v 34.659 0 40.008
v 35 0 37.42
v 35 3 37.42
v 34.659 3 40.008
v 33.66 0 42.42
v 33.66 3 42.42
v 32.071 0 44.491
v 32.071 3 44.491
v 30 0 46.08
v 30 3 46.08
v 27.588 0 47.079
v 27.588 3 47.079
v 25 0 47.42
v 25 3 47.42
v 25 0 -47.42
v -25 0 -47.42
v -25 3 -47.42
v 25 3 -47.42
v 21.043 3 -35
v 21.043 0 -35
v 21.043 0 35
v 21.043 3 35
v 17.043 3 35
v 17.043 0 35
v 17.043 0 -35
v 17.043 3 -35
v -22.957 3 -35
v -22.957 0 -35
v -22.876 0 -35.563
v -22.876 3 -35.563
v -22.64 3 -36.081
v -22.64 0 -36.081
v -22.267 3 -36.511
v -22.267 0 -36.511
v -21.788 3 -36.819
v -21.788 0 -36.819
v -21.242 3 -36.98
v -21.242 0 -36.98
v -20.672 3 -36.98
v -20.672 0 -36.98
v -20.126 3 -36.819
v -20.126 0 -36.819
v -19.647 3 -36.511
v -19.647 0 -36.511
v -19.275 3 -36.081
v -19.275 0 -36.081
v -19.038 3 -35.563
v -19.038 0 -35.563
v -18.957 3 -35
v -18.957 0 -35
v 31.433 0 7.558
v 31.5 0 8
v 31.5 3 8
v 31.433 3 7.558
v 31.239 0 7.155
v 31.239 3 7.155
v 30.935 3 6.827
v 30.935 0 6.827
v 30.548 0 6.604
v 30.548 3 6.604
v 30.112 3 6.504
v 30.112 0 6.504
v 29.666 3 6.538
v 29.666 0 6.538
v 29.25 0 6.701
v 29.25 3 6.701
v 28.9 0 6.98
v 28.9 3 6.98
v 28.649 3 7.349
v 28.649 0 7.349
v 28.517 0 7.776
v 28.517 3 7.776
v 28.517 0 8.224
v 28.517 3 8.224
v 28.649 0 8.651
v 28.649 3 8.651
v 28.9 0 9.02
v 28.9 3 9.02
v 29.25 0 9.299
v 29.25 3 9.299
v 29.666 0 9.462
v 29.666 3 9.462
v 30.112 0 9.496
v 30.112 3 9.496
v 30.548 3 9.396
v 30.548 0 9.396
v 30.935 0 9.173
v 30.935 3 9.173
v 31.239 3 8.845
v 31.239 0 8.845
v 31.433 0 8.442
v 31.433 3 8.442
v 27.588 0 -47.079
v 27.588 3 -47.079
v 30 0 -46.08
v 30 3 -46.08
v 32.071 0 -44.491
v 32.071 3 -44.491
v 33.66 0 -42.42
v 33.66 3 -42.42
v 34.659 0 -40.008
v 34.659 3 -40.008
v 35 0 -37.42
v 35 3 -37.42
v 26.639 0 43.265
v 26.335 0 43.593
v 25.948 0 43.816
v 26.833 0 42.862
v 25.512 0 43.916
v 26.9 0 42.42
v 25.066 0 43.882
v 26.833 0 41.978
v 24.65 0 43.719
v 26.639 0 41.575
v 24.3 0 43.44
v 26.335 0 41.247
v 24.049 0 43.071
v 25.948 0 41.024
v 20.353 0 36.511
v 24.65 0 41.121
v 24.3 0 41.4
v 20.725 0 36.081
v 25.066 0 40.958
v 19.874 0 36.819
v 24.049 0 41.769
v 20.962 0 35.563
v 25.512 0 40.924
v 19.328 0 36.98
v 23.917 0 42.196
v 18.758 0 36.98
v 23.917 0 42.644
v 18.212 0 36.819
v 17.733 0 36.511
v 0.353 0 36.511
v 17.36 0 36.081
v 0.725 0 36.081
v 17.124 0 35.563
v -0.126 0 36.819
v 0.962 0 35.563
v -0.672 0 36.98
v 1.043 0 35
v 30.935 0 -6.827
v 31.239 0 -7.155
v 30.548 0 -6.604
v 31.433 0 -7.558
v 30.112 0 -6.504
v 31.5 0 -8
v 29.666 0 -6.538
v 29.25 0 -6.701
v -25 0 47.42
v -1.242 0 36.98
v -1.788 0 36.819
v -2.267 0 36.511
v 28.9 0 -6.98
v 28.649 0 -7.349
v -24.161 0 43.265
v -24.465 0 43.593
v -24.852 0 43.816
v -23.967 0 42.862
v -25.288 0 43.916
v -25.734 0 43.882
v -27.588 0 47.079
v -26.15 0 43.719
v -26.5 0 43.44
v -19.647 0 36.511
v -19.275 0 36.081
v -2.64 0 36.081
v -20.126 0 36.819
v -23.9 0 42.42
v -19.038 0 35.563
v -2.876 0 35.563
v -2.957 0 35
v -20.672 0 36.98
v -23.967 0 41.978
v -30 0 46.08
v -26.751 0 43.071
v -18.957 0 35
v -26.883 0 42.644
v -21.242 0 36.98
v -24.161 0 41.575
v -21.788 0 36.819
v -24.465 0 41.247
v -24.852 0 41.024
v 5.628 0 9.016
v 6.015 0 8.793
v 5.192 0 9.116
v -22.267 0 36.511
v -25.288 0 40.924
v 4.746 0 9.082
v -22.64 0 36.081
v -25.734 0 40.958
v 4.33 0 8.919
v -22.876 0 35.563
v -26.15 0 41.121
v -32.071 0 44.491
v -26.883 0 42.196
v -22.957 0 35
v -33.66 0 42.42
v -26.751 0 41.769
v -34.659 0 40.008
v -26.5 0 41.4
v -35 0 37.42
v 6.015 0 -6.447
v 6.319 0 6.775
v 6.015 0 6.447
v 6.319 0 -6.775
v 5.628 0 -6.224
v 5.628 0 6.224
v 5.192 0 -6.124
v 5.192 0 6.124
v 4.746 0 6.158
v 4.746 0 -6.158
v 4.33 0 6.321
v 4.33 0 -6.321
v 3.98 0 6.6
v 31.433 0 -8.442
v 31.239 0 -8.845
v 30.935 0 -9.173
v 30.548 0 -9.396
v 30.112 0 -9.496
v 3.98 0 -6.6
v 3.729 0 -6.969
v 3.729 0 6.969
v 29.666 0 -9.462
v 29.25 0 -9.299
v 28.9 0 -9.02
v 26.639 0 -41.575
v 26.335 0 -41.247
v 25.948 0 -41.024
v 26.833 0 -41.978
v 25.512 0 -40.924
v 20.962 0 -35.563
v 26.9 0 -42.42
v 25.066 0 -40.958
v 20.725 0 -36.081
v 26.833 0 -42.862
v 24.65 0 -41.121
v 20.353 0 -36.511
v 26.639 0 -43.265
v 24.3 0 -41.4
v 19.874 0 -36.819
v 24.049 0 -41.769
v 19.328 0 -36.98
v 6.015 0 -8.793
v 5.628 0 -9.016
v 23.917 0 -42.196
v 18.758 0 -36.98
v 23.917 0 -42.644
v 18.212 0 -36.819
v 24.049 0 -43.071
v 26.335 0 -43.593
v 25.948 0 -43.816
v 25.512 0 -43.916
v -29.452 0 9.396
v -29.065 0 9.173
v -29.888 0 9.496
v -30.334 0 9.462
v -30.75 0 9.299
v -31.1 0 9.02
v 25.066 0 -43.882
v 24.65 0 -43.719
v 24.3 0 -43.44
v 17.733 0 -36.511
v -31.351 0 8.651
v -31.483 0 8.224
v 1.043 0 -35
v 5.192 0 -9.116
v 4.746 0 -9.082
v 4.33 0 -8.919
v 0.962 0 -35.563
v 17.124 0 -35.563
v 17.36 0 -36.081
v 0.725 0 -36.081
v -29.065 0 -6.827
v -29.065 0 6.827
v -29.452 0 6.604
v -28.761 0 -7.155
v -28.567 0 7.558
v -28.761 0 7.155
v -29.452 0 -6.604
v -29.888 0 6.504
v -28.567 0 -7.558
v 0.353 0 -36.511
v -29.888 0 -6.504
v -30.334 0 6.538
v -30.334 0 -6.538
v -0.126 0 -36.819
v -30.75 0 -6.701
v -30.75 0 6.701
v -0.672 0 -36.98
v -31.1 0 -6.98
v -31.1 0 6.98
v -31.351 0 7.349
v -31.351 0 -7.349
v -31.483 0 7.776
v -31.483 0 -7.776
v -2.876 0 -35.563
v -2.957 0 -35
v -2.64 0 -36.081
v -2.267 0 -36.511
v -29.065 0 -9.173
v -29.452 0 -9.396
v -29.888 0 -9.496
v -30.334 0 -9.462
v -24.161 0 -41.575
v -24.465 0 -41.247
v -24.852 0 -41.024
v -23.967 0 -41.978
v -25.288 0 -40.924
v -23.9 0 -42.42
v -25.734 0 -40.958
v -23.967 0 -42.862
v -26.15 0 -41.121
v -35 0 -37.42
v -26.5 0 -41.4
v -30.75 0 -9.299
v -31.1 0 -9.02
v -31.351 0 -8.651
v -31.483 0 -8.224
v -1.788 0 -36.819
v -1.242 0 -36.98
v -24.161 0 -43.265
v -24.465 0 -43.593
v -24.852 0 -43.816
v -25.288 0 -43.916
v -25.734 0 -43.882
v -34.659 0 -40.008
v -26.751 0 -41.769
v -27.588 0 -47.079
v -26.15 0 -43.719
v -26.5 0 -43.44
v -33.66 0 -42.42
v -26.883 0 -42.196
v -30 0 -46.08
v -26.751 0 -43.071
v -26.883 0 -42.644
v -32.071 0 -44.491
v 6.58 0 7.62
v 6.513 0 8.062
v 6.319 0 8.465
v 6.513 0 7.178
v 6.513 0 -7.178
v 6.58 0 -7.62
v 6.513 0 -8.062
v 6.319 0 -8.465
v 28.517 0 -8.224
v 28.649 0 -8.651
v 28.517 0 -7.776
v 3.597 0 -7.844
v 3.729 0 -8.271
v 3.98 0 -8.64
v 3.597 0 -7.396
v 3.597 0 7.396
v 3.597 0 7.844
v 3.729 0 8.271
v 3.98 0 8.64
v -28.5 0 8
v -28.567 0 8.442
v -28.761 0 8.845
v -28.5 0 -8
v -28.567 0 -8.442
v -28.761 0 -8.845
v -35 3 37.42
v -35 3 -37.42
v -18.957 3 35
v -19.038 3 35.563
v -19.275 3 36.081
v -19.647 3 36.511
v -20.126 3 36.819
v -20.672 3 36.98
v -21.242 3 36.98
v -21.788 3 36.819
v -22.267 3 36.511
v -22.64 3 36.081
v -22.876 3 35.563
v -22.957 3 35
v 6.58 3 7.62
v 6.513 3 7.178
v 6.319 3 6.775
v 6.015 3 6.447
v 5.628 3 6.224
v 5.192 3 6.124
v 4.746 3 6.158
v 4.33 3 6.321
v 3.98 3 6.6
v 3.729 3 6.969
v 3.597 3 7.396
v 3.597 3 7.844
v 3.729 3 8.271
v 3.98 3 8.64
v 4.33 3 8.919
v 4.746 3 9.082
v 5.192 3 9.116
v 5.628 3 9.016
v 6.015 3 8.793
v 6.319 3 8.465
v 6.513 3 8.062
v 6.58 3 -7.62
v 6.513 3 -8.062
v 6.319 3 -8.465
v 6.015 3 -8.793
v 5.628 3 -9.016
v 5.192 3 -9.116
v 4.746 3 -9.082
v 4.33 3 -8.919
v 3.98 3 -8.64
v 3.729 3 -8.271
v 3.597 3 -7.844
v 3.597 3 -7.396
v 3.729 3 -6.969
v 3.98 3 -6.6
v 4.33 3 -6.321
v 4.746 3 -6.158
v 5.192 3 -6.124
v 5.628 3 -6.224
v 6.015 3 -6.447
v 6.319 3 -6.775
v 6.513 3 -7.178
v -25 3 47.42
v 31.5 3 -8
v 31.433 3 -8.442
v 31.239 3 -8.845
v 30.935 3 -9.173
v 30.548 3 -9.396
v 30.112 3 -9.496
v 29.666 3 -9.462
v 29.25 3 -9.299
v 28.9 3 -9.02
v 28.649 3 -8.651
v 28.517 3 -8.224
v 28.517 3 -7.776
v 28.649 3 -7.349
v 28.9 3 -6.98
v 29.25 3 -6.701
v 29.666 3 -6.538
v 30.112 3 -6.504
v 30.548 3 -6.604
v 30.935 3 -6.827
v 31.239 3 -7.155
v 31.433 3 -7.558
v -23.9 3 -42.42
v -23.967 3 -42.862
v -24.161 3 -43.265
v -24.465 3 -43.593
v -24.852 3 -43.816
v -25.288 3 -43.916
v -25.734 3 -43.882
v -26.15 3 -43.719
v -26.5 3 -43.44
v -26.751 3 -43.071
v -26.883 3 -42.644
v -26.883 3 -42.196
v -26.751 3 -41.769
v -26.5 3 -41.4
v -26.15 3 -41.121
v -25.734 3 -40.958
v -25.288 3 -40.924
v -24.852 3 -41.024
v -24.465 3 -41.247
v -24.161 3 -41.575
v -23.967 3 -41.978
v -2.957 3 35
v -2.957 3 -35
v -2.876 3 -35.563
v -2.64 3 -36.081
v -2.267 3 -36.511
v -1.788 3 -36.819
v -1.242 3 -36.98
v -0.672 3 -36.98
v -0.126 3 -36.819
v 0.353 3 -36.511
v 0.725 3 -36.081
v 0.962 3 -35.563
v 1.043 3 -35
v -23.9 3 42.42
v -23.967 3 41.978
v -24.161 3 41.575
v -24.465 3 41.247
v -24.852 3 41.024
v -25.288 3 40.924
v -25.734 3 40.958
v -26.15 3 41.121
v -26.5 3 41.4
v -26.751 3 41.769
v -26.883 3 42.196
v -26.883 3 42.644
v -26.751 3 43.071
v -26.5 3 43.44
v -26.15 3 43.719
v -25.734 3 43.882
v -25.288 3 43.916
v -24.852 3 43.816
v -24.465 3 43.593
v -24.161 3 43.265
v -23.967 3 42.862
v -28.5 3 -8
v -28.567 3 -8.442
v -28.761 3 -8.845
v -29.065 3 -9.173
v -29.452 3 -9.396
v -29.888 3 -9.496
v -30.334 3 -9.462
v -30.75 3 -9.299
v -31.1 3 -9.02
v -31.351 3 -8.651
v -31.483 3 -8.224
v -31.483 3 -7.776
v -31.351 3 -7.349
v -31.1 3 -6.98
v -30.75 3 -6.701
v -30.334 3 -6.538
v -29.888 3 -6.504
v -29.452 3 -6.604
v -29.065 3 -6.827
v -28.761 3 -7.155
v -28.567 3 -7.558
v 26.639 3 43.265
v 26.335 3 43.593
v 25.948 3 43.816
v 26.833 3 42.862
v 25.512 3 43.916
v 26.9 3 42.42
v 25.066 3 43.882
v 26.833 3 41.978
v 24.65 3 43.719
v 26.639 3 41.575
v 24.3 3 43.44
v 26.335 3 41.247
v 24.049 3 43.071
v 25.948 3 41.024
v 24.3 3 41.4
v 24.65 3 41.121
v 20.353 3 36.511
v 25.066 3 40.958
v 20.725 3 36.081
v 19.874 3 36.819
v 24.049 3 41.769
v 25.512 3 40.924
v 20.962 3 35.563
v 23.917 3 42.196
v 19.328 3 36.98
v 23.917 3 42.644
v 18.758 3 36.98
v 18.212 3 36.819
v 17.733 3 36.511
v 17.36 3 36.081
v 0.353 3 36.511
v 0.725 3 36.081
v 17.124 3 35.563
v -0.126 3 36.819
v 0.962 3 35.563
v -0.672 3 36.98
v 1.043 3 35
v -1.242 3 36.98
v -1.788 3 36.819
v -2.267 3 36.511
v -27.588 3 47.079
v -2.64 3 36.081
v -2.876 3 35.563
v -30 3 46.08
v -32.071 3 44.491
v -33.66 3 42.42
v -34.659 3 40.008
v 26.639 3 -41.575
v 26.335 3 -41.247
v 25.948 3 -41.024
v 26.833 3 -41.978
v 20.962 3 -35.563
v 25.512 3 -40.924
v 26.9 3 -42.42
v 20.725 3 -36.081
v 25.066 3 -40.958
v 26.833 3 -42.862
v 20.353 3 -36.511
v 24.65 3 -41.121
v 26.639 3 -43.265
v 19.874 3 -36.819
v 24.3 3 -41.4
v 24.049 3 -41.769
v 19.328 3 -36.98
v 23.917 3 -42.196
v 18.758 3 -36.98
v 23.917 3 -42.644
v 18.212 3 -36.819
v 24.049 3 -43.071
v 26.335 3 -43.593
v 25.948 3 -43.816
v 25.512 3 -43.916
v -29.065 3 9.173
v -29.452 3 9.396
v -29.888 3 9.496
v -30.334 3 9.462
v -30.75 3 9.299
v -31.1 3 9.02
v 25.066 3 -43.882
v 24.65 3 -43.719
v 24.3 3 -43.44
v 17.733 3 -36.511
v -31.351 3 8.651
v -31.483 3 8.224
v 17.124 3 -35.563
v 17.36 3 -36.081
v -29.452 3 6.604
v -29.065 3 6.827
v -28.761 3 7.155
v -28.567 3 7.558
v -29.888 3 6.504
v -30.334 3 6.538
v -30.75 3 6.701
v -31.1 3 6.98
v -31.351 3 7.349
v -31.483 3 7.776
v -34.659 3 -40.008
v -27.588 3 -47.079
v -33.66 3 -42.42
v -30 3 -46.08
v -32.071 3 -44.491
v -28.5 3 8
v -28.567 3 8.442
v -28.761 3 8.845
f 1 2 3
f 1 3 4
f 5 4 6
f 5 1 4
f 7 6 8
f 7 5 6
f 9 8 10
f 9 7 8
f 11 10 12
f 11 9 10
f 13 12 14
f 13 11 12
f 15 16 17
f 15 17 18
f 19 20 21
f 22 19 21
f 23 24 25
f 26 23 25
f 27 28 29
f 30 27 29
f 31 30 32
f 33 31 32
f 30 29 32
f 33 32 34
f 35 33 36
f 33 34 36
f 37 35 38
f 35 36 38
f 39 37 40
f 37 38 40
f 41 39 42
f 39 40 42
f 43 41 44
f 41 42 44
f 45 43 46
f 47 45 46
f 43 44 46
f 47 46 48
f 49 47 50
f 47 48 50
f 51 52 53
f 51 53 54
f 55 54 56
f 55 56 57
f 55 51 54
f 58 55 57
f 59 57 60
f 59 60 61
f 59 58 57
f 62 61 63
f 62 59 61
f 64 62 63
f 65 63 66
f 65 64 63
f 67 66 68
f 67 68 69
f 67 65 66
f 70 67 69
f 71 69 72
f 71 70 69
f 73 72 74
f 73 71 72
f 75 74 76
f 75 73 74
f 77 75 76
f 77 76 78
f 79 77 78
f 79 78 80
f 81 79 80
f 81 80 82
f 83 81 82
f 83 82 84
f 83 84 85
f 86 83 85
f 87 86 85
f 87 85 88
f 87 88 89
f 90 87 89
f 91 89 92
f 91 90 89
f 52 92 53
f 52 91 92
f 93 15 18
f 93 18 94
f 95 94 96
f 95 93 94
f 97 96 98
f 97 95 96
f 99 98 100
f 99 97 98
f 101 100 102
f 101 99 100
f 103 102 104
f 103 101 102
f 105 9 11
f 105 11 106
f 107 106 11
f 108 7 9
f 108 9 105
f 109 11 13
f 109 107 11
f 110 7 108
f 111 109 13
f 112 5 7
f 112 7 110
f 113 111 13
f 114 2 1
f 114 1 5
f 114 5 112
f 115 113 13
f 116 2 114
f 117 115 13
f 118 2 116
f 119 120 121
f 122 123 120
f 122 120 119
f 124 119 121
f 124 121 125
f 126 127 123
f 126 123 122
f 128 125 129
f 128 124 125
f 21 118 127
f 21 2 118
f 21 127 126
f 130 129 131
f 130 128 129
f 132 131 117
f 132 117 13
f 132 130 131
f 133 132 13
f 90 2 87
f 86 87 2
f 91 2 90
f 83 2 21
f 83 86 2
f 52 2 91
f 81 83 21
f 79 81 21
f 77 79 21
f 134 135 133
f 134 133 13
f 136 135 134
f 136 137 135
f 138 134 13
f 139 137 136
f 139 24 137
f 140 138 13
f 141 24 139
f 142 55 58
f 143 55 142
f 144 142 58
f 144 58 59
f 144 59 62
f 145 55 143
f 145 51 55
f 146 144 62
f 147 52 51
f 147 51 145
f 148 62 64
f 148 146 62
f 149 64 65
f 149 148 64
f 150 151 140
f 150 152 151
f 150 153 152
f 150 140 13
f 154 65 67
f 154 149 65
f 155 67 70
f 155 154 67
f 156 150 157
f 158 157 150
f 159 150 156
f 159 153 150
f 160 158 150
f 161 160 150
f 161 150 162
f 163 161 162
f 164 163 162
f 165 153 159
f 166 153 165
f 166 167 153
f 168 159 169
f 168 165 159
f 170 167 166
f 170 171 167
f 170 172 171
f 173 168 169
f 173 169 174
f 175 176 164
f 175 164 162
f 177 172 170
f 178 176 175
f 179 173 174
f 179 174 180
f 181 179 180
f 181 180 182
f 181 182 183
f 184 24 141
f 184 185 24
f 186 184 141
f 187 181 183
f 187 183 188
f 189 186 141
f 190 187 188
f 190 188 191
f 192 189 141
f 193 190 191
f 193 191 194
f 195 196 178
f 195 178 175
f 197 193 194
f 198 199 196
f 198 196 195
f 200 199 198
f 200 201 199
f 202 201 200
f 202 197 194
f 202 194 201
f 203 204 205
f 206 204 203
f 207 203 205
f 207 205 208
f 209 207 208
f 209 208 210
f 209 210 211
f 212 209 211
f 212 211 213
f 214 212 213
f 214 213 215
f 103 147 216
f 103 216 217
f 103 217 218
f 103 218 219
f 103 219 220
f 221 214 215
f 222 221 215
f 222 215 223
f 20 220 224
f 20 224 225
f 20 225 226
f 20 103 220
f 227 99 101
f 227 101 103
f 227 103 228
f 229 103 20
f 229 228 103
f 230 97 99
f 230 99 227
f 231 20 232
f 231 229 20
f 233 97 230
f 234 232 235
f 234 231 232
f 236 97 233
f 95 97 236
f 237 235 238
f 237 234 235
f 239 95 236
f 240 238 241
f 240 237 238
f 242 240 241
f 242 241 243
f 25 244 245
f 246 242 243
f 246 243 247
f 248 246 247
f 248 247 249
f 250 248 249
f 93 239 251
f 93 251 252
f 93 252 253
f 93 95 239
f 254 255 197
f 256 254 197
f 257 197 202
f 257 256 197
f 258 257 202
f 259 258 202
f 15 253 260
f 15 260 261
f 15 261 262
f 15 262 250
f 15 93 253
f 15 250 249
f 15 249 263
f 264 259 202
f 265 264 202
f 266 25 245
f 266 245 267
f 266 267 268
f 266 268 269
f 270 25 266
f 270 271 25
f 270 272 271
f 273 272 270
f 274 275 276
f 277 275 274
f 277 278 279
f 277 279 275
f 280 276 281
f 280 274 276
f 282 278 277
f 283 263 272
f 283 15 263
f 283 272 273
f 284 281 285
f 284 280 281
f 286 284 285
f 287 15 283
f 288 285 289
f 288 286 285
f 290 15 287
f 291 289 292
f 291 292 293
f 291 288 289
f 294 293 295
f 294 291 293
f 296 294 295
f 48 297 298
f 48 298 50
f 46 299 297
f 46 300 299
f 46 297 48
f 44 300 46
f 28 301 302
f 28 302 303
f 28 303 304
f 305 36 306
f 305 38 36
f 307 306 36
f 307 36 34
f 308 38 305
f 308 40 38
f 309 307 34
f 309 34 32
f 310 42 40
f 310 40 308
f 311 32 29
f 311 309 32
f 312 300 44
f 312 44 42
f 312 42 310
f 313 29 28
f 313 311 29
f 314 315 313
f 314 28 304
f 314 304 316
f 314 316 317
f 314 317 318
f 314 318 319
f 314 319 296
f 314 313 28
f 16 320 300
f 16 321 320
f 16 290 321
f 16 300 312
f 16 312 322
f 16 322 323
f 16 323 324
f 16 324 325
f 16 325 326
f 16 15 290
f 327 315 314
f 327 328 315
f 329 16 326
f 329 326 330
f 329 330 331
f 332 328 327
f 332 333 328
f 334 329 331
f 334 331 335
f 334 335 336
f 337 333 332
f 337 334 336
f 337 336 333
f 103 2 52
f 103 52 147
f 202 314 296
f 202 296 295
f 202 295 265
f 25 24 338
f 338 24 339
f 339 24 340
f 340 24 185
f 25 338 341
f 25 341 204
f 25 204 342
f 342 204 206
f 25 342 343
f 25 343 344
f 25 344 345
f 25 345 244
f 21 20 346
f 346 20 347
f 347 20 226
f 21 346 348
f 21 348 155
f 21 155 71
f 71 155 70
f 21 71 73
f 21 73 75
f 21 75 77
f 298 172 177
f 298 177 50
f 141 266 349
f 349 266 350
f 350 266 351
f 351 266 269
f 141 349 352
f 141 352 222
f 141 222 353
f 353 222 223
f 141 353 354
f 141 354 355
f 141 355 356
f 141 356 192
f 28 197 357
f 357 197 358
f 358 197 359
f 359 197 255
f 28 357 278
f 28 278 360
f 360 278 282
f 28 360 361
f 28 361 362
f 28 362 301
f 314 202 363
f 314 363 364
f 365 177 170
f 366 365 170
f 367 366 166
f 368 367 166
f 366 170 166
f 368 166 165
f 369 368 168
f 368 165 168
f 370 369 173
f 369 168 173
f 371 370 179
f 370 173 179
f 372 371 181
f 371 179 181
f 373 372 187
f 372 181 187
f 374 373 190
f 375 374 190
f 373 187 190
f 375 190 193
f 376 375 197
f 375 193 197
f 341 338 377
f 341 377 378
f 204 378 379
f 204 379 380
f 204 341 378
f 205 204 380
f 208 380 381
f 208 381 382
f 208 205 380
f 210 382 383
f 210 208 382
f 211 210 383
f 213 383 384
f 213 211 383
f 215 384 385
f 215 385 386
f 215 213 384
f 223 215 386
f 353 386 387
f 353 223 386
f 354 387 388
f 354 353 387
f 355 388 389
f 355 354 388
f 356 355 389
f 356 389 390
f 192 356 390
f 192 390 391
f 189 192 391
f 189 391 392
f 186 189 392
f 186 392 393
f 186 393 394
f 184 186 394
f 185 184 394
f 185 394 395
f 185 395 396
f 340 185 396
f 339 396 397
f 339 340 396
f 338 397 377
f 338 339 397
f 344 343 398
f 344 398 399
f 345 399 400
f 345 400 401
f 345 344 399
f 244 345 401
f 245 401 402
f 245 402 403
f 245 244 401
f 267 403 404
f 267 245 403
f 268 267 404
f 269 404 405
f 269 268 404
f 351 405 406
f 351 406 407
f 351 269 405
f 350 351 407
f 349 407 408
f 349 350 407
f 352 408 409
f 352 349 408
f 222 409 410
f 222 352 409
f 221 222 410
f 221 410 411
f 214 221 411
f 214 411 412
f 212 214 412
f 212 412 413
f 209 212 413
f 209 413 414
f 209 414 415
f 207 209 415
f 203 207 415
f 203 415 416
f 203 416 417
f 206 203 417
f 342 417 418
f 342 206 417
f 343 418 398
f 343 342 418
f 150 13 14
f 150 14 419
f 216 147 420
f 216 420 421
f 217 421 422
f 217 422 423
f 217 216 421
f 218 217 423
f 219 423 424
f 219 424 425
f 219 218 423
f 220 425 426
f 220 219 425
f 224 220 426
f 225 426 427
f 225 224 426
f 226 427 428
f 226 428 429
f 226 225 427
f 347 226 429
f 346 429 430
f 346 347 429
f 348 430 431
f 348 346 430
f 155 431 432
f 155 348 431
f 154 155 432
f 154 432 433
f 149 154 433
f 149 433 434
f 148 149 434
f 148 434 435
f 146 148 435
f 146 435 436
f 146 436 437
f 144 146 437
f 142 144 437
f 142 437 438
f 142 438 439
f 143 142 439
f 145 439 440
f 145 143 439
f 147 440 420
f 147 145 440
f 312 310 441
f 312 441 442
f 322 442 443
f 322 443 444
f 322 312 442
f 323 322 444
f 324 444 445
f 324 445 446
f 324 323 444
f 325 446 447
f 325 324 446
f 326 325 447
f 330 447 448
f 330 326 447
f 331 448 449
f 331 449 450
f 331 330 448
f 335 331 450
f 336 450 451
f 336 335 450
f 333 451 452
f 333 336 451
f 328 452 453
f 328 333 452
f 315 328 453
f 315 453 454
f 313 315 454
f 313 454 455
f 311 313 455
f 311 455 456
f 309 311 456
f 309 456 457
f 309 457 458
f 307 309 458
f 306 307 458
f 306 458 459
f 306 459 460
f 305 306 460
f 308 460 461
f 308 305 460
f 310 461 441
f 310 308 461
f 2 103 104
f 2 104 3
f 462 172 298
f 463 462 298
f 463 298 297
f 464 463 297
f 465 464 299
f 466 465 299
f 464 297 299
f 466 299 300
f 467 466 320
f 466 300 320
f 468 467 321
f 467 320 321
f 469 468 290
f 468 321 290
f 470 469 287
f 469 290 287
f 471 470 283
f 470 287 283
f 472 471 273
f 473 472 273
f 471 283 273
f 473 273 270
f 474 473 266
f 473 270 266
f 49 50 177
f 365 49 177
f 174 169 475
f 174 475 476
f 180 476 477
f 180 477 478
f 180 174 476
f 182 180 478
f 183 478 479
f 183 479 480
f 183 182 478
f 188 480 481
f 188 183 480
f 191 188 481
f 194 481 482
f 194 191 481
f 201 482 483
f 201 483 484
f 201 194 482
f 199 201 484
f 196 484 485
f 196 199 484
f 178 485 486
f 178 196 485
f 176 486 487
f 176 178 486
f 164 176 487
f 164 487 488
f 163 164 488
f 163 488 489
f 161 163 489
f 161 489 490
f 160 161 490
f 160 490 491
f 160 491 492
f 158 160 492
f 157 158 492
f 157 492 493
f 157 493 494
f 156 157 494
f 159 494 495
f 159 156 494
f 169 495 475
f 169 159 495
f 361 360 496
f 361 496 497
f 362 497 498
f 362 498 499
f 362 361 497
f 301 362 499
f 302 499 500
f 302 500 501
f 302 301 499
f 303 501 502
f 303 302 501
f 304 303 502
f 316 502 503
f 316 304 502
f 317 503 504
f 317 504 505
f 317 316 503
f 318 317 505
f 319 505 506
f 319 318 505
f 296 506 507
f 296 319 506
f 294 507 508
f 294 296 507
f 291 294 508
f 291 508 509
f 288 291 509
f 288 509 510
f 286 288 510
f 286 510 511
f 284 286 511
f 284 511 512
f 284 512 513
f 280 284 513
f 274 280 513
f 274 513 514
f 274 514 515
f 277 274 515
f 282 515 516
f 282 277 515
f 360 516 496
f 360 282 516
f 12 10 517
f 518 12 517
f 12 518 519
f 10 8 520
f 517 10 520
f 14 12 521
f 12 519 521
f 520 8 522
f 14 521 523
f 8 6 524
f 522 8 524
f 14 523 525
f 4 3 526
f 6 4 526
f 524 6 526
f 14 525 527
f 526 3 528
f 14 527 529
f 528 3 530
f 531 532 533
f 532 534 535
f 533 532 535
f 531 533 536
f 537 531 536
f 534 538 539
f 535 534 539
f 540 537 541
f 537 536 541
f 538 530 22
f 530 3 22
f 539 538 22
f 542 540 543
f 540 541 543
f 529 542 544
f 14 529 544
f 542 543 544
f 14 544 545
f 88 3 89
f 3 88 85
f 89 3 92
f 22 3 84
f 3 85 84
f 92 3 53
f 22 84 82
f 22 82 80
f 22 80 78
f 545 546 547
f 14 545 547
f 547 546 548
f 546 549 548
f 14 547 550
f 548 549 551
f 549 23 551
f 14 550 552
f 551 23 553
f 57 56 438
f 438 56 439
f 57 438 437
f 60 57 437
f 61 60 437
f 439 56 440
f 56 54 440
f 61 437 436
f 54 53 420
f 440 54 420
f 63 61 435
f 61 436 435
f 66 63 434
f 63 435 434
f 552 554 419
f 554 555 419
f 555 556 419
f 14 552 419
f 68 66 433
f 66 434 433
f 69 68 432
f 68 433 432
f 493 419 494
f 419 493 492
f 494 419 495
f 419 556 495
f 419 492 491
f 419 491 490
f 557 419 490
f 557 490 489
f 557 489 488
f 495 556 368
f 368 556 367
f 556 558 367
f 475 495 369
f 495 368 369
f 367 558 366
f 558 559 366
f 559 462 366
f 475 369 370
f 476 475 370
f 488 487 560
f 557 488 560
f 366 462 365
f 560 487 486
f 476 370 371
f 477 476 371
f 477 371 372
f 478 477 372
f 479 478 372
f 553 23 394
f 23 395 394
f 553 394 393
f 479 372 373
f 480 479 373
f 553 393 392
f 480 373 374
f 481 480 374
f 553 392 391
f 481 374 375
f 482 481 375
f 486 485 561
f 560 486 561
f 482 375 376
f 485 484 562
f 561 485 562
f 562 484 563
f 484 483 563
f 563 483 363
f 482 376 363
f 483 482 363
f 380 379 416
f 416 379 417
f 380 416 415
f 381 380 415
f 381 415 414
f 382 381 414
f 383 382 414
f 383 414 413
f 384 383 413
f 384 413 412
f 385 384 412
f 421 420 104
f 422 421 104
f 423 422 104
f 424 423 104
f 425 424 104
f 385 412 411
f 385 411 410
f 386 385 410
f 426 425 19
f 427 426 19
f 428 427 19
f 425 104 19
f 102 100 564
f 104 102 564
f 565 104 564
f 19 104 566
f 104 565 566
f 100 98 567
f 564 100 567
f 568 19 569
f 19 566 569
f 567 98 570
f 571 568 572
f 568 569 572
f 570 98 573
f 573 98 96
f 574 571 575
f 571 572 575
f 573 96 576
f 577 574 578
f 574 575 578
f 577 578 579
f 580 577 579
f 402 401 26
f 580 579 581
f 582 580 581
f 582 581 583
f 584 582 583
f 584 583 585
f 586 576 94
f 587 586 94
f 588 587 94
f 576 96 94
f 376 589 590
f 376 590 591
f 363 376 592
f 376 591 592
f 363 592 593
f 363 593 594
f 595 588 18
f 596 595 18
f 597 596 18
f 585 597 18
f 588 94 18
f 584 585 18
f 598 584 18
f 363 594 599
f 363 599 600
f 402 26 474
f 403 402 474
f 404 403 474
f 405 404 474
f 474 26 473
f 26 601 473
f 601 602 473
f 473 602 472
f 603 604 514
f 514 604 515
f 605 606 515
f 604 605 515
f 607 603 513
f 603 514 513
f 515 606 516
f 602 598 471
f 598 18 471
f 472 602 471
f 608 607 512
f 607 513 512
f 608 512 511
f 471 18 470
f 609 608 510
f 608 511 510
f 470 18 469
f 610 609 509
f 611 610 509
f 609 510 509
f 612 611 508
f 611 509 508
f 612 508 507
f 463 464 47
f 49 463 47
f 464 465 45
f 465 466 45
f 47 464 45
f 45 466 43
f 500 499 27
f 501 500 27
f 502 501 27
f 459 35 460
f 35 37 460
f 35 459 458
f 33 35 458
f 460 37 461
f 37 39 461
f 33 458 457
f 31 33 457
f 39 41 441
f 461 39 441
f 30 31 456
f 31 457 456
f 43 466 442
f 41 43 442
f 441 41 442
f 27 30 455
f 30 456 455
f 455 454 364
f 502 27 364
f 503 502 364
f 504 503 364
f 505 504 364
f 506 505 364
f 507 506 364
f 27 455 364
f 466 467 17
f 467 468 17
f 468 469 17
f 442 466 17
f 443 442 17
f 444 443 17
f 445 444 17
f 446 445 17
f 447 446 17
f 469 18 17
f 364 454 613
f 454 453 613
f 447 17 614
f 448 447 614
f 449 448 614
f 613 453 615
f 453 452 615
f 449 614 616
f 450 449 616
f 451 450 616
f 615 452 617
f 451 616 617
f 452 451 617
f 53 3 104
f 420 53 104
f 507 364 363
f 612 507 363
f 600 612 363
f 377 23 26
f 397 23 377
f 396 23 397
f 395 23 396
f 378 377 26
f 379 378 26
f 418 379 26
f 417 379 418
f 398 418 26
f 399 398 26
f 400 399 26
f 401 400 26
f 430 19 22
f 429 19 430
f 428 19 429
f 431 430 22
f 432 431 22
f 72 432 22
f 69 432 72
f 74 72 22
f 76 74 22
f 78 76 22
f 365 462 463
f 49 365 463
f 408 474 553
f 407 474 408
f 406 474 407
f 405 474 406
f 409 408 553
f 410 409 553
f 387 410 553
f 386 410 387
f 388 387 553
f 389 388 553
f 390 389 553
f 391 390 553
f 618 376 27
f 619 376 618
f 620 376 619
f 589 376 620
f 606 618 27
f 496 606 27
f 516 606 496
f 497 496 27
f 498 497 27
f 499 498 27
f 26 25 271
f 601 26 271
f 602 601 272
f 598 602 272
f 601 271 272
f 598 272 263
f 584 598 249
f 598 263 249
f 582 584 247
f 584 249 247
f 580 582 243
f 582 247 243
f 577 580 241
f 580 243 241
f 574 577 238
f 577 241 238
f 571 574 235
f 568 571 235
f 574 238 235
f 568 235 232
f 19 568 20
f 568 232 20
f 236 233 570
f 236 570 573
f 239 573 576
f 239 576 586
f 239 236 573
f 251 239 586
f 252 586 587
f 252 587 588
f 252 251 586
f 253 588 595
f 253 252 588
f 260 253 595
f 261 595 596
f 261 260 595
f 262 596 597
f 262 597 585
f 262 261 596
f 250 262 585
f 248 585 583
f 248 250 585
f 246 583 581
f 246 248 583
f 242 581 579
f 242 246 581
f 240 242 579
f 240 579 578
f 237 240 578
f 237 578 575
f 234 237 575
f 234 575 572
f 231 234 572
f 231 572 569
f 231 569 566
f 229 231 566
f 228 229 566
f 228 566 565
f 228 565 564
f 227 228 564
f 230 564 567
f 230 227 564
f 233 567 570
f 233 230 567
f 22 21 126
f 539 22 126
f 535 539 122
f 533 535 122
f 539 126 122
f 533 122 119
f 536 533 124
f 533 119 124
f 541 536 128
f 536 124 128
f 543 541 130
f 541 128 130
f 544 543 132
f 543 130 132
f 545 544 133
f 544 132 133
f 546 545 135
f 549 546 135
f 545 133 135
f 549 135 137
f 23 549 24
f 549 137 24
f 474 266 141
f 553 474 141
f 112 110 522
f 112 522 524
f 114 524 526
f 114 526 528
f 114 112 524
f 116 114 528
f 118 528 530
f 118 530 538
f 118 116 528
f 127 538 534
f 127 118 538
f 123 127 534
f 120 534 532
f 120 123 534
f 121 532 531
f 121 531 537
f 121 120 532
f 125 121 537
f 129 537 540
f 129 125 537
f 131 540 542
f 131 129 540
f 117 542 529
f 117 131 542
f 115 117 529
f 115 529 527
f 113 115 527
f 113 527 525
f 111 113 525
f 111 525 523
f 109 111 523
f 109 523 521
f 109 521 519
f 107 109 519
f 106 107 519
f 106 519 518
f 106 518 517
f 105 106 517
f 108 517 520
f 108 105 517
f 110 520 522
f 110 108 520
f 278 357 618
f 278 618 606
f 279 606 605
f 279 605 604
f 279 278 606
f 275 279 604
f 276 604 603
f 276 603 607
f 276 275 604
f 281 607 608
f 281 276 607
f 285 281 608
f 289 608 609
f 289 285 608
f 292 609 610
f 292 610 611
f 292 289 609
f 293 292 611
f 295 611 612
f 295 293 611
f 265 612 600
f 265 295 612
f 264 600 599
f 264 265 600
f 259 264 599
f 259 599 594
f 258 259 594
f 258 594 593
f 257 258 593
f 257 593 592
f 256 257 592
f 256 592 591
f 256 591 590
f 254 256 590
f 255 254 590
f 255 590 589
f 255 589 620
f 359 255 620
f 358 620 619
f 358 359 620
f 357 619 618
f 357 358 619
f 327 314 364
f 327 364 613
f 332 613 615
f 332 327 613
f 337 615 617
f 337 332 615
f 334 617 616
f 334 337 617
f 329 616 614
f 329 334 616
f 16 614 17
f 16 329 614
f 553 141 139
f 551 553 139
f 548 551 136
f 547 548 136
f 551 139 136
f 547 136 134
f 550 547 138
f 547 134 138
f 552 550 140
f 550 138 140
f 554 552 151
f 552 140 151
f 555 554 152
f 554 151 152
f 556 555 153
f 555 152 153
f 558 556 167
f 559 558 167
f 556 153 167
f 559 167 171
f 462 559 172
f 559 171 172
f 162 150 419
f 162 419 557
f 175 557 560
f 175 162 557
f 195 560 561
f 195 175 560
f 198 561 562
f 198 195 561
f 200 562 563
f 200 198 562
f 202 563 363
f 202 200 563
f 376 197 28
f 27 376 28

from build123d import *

# Parameters (mm, degrees)
SKETCH_1_R      = 1.5
EXTRUDE_1_DEPTH = 3


with BuildPart() as part:
    # 草图1 → 凸台-拉伸1 (new body)
    with BuildSketch(Plane(origin=(0, 0, 0), x_dir=(1, 0, 0), z_dir=(0, 1, 0))):
        with BuildLine():
            Line((-25, 47.42), (25, 47.42))
            ThreePointArc((25, 47.42), (32.071067812, 44.491067812), (35, 37.42))
            Line((35, 37.42), (35, -37.42))
            ThreePointArc((35, -37.42), (32.071067812, -44.491067812), (25, -47.42))
            Line((25, -47.42), (-25, -47.42))
            ThreePointArc((-25, -47.42), (-32.071067812, -44.491067812), (-35, -37.42))
            Line((-35, -37.42), (-35, 37.42))
            ThreePointArc((-35, 37.42), (-32.071067812, 44.491067812), (-25, 47.42))
        make_face()
        with Locations((-30, 8)):
            Circle(SKETCH_1_R, mode=Mode.SUBTRACT)
        with Locations((30, 8)):
            Circle(SKETCH_1_R, mode=Mode.SUBTRACT)
        with Locations((-30, -8)):
            Circle(SKETCH_1_R, mode=Mode.SUBTRACT)
        with Locations((30, -8)):
            Circle(SKETCH_1_R, mode=Mode.SUBTRACT)
        with Locations((-25.4, 42.42)):
            Circle(SKETCH_1_R, mode=Mode.SUBTRACT)
        with Locations((25.4, 42.42)):
            Circle(SKETCH_1_R, mode=Mode.SUBTRACT)
        with Locations((-25.4, -42.42)):
            Circle(SKETCH_1_R, mode=Mode.SUBTRACT)
        with Locations((25.4, -42.42)):
            Circle(SKETCH_1_R, mode=Mode.SUBTRACT)
        with Locations((5.08, -7.62)):
            Circle(SKETCH_1_R, mode=Mode.SUBTRACT)
        with Locations((5.08, 7.62)):
            Circle(SKETCH_1_R, mode=Mode.SUBTRACT)
        with BuildLine():
            Line((-22.95709571, -35), (-22.95709571, 35))
            ThreePointArc((-22.95709571, 35), (-20.95709571, 37), (-18.95709571, 35))
            Line((-18.95709571, 35), (-18.95709571, -35))
            ThreePointArc((-18.95709571, -35), (-20.95709571, -37), (-22.95709571, -35))
        make_face(mode=Mode.SUBTRACT)
        with BuildLine():
            Line((-2.95709571, -35), (-2.95709571, 35))
            ThreePointArc((-2.95709571, 35), (-0.95709571, 37), (1.04290429, 35))
            Line((1.04290429, 35), (1.04290429, -35))
            ThreePointArc((1.04290429, -35), (-0.95709571, -37), (-2.95709571, -35))
        make_face(mode=Mode.SUBTRACT)
        with BuildLine():
            Line((17.04290429, -35), (17.04290429, 35))
            ThreePointArc((17.04290429, 35), (19.04290429, 37), (21.04290429, 35))
            Line((21.04290429, 35), (21.04290429, -35))
            ThreePointArc((21.04290429, -35), (19.04290429, -37), (17.04290429, -35))
        make_face(mode=Mode.SUBTRACT)
    extrude(amount=EXTRUDE_1_DEPTH)


solid = part.part
